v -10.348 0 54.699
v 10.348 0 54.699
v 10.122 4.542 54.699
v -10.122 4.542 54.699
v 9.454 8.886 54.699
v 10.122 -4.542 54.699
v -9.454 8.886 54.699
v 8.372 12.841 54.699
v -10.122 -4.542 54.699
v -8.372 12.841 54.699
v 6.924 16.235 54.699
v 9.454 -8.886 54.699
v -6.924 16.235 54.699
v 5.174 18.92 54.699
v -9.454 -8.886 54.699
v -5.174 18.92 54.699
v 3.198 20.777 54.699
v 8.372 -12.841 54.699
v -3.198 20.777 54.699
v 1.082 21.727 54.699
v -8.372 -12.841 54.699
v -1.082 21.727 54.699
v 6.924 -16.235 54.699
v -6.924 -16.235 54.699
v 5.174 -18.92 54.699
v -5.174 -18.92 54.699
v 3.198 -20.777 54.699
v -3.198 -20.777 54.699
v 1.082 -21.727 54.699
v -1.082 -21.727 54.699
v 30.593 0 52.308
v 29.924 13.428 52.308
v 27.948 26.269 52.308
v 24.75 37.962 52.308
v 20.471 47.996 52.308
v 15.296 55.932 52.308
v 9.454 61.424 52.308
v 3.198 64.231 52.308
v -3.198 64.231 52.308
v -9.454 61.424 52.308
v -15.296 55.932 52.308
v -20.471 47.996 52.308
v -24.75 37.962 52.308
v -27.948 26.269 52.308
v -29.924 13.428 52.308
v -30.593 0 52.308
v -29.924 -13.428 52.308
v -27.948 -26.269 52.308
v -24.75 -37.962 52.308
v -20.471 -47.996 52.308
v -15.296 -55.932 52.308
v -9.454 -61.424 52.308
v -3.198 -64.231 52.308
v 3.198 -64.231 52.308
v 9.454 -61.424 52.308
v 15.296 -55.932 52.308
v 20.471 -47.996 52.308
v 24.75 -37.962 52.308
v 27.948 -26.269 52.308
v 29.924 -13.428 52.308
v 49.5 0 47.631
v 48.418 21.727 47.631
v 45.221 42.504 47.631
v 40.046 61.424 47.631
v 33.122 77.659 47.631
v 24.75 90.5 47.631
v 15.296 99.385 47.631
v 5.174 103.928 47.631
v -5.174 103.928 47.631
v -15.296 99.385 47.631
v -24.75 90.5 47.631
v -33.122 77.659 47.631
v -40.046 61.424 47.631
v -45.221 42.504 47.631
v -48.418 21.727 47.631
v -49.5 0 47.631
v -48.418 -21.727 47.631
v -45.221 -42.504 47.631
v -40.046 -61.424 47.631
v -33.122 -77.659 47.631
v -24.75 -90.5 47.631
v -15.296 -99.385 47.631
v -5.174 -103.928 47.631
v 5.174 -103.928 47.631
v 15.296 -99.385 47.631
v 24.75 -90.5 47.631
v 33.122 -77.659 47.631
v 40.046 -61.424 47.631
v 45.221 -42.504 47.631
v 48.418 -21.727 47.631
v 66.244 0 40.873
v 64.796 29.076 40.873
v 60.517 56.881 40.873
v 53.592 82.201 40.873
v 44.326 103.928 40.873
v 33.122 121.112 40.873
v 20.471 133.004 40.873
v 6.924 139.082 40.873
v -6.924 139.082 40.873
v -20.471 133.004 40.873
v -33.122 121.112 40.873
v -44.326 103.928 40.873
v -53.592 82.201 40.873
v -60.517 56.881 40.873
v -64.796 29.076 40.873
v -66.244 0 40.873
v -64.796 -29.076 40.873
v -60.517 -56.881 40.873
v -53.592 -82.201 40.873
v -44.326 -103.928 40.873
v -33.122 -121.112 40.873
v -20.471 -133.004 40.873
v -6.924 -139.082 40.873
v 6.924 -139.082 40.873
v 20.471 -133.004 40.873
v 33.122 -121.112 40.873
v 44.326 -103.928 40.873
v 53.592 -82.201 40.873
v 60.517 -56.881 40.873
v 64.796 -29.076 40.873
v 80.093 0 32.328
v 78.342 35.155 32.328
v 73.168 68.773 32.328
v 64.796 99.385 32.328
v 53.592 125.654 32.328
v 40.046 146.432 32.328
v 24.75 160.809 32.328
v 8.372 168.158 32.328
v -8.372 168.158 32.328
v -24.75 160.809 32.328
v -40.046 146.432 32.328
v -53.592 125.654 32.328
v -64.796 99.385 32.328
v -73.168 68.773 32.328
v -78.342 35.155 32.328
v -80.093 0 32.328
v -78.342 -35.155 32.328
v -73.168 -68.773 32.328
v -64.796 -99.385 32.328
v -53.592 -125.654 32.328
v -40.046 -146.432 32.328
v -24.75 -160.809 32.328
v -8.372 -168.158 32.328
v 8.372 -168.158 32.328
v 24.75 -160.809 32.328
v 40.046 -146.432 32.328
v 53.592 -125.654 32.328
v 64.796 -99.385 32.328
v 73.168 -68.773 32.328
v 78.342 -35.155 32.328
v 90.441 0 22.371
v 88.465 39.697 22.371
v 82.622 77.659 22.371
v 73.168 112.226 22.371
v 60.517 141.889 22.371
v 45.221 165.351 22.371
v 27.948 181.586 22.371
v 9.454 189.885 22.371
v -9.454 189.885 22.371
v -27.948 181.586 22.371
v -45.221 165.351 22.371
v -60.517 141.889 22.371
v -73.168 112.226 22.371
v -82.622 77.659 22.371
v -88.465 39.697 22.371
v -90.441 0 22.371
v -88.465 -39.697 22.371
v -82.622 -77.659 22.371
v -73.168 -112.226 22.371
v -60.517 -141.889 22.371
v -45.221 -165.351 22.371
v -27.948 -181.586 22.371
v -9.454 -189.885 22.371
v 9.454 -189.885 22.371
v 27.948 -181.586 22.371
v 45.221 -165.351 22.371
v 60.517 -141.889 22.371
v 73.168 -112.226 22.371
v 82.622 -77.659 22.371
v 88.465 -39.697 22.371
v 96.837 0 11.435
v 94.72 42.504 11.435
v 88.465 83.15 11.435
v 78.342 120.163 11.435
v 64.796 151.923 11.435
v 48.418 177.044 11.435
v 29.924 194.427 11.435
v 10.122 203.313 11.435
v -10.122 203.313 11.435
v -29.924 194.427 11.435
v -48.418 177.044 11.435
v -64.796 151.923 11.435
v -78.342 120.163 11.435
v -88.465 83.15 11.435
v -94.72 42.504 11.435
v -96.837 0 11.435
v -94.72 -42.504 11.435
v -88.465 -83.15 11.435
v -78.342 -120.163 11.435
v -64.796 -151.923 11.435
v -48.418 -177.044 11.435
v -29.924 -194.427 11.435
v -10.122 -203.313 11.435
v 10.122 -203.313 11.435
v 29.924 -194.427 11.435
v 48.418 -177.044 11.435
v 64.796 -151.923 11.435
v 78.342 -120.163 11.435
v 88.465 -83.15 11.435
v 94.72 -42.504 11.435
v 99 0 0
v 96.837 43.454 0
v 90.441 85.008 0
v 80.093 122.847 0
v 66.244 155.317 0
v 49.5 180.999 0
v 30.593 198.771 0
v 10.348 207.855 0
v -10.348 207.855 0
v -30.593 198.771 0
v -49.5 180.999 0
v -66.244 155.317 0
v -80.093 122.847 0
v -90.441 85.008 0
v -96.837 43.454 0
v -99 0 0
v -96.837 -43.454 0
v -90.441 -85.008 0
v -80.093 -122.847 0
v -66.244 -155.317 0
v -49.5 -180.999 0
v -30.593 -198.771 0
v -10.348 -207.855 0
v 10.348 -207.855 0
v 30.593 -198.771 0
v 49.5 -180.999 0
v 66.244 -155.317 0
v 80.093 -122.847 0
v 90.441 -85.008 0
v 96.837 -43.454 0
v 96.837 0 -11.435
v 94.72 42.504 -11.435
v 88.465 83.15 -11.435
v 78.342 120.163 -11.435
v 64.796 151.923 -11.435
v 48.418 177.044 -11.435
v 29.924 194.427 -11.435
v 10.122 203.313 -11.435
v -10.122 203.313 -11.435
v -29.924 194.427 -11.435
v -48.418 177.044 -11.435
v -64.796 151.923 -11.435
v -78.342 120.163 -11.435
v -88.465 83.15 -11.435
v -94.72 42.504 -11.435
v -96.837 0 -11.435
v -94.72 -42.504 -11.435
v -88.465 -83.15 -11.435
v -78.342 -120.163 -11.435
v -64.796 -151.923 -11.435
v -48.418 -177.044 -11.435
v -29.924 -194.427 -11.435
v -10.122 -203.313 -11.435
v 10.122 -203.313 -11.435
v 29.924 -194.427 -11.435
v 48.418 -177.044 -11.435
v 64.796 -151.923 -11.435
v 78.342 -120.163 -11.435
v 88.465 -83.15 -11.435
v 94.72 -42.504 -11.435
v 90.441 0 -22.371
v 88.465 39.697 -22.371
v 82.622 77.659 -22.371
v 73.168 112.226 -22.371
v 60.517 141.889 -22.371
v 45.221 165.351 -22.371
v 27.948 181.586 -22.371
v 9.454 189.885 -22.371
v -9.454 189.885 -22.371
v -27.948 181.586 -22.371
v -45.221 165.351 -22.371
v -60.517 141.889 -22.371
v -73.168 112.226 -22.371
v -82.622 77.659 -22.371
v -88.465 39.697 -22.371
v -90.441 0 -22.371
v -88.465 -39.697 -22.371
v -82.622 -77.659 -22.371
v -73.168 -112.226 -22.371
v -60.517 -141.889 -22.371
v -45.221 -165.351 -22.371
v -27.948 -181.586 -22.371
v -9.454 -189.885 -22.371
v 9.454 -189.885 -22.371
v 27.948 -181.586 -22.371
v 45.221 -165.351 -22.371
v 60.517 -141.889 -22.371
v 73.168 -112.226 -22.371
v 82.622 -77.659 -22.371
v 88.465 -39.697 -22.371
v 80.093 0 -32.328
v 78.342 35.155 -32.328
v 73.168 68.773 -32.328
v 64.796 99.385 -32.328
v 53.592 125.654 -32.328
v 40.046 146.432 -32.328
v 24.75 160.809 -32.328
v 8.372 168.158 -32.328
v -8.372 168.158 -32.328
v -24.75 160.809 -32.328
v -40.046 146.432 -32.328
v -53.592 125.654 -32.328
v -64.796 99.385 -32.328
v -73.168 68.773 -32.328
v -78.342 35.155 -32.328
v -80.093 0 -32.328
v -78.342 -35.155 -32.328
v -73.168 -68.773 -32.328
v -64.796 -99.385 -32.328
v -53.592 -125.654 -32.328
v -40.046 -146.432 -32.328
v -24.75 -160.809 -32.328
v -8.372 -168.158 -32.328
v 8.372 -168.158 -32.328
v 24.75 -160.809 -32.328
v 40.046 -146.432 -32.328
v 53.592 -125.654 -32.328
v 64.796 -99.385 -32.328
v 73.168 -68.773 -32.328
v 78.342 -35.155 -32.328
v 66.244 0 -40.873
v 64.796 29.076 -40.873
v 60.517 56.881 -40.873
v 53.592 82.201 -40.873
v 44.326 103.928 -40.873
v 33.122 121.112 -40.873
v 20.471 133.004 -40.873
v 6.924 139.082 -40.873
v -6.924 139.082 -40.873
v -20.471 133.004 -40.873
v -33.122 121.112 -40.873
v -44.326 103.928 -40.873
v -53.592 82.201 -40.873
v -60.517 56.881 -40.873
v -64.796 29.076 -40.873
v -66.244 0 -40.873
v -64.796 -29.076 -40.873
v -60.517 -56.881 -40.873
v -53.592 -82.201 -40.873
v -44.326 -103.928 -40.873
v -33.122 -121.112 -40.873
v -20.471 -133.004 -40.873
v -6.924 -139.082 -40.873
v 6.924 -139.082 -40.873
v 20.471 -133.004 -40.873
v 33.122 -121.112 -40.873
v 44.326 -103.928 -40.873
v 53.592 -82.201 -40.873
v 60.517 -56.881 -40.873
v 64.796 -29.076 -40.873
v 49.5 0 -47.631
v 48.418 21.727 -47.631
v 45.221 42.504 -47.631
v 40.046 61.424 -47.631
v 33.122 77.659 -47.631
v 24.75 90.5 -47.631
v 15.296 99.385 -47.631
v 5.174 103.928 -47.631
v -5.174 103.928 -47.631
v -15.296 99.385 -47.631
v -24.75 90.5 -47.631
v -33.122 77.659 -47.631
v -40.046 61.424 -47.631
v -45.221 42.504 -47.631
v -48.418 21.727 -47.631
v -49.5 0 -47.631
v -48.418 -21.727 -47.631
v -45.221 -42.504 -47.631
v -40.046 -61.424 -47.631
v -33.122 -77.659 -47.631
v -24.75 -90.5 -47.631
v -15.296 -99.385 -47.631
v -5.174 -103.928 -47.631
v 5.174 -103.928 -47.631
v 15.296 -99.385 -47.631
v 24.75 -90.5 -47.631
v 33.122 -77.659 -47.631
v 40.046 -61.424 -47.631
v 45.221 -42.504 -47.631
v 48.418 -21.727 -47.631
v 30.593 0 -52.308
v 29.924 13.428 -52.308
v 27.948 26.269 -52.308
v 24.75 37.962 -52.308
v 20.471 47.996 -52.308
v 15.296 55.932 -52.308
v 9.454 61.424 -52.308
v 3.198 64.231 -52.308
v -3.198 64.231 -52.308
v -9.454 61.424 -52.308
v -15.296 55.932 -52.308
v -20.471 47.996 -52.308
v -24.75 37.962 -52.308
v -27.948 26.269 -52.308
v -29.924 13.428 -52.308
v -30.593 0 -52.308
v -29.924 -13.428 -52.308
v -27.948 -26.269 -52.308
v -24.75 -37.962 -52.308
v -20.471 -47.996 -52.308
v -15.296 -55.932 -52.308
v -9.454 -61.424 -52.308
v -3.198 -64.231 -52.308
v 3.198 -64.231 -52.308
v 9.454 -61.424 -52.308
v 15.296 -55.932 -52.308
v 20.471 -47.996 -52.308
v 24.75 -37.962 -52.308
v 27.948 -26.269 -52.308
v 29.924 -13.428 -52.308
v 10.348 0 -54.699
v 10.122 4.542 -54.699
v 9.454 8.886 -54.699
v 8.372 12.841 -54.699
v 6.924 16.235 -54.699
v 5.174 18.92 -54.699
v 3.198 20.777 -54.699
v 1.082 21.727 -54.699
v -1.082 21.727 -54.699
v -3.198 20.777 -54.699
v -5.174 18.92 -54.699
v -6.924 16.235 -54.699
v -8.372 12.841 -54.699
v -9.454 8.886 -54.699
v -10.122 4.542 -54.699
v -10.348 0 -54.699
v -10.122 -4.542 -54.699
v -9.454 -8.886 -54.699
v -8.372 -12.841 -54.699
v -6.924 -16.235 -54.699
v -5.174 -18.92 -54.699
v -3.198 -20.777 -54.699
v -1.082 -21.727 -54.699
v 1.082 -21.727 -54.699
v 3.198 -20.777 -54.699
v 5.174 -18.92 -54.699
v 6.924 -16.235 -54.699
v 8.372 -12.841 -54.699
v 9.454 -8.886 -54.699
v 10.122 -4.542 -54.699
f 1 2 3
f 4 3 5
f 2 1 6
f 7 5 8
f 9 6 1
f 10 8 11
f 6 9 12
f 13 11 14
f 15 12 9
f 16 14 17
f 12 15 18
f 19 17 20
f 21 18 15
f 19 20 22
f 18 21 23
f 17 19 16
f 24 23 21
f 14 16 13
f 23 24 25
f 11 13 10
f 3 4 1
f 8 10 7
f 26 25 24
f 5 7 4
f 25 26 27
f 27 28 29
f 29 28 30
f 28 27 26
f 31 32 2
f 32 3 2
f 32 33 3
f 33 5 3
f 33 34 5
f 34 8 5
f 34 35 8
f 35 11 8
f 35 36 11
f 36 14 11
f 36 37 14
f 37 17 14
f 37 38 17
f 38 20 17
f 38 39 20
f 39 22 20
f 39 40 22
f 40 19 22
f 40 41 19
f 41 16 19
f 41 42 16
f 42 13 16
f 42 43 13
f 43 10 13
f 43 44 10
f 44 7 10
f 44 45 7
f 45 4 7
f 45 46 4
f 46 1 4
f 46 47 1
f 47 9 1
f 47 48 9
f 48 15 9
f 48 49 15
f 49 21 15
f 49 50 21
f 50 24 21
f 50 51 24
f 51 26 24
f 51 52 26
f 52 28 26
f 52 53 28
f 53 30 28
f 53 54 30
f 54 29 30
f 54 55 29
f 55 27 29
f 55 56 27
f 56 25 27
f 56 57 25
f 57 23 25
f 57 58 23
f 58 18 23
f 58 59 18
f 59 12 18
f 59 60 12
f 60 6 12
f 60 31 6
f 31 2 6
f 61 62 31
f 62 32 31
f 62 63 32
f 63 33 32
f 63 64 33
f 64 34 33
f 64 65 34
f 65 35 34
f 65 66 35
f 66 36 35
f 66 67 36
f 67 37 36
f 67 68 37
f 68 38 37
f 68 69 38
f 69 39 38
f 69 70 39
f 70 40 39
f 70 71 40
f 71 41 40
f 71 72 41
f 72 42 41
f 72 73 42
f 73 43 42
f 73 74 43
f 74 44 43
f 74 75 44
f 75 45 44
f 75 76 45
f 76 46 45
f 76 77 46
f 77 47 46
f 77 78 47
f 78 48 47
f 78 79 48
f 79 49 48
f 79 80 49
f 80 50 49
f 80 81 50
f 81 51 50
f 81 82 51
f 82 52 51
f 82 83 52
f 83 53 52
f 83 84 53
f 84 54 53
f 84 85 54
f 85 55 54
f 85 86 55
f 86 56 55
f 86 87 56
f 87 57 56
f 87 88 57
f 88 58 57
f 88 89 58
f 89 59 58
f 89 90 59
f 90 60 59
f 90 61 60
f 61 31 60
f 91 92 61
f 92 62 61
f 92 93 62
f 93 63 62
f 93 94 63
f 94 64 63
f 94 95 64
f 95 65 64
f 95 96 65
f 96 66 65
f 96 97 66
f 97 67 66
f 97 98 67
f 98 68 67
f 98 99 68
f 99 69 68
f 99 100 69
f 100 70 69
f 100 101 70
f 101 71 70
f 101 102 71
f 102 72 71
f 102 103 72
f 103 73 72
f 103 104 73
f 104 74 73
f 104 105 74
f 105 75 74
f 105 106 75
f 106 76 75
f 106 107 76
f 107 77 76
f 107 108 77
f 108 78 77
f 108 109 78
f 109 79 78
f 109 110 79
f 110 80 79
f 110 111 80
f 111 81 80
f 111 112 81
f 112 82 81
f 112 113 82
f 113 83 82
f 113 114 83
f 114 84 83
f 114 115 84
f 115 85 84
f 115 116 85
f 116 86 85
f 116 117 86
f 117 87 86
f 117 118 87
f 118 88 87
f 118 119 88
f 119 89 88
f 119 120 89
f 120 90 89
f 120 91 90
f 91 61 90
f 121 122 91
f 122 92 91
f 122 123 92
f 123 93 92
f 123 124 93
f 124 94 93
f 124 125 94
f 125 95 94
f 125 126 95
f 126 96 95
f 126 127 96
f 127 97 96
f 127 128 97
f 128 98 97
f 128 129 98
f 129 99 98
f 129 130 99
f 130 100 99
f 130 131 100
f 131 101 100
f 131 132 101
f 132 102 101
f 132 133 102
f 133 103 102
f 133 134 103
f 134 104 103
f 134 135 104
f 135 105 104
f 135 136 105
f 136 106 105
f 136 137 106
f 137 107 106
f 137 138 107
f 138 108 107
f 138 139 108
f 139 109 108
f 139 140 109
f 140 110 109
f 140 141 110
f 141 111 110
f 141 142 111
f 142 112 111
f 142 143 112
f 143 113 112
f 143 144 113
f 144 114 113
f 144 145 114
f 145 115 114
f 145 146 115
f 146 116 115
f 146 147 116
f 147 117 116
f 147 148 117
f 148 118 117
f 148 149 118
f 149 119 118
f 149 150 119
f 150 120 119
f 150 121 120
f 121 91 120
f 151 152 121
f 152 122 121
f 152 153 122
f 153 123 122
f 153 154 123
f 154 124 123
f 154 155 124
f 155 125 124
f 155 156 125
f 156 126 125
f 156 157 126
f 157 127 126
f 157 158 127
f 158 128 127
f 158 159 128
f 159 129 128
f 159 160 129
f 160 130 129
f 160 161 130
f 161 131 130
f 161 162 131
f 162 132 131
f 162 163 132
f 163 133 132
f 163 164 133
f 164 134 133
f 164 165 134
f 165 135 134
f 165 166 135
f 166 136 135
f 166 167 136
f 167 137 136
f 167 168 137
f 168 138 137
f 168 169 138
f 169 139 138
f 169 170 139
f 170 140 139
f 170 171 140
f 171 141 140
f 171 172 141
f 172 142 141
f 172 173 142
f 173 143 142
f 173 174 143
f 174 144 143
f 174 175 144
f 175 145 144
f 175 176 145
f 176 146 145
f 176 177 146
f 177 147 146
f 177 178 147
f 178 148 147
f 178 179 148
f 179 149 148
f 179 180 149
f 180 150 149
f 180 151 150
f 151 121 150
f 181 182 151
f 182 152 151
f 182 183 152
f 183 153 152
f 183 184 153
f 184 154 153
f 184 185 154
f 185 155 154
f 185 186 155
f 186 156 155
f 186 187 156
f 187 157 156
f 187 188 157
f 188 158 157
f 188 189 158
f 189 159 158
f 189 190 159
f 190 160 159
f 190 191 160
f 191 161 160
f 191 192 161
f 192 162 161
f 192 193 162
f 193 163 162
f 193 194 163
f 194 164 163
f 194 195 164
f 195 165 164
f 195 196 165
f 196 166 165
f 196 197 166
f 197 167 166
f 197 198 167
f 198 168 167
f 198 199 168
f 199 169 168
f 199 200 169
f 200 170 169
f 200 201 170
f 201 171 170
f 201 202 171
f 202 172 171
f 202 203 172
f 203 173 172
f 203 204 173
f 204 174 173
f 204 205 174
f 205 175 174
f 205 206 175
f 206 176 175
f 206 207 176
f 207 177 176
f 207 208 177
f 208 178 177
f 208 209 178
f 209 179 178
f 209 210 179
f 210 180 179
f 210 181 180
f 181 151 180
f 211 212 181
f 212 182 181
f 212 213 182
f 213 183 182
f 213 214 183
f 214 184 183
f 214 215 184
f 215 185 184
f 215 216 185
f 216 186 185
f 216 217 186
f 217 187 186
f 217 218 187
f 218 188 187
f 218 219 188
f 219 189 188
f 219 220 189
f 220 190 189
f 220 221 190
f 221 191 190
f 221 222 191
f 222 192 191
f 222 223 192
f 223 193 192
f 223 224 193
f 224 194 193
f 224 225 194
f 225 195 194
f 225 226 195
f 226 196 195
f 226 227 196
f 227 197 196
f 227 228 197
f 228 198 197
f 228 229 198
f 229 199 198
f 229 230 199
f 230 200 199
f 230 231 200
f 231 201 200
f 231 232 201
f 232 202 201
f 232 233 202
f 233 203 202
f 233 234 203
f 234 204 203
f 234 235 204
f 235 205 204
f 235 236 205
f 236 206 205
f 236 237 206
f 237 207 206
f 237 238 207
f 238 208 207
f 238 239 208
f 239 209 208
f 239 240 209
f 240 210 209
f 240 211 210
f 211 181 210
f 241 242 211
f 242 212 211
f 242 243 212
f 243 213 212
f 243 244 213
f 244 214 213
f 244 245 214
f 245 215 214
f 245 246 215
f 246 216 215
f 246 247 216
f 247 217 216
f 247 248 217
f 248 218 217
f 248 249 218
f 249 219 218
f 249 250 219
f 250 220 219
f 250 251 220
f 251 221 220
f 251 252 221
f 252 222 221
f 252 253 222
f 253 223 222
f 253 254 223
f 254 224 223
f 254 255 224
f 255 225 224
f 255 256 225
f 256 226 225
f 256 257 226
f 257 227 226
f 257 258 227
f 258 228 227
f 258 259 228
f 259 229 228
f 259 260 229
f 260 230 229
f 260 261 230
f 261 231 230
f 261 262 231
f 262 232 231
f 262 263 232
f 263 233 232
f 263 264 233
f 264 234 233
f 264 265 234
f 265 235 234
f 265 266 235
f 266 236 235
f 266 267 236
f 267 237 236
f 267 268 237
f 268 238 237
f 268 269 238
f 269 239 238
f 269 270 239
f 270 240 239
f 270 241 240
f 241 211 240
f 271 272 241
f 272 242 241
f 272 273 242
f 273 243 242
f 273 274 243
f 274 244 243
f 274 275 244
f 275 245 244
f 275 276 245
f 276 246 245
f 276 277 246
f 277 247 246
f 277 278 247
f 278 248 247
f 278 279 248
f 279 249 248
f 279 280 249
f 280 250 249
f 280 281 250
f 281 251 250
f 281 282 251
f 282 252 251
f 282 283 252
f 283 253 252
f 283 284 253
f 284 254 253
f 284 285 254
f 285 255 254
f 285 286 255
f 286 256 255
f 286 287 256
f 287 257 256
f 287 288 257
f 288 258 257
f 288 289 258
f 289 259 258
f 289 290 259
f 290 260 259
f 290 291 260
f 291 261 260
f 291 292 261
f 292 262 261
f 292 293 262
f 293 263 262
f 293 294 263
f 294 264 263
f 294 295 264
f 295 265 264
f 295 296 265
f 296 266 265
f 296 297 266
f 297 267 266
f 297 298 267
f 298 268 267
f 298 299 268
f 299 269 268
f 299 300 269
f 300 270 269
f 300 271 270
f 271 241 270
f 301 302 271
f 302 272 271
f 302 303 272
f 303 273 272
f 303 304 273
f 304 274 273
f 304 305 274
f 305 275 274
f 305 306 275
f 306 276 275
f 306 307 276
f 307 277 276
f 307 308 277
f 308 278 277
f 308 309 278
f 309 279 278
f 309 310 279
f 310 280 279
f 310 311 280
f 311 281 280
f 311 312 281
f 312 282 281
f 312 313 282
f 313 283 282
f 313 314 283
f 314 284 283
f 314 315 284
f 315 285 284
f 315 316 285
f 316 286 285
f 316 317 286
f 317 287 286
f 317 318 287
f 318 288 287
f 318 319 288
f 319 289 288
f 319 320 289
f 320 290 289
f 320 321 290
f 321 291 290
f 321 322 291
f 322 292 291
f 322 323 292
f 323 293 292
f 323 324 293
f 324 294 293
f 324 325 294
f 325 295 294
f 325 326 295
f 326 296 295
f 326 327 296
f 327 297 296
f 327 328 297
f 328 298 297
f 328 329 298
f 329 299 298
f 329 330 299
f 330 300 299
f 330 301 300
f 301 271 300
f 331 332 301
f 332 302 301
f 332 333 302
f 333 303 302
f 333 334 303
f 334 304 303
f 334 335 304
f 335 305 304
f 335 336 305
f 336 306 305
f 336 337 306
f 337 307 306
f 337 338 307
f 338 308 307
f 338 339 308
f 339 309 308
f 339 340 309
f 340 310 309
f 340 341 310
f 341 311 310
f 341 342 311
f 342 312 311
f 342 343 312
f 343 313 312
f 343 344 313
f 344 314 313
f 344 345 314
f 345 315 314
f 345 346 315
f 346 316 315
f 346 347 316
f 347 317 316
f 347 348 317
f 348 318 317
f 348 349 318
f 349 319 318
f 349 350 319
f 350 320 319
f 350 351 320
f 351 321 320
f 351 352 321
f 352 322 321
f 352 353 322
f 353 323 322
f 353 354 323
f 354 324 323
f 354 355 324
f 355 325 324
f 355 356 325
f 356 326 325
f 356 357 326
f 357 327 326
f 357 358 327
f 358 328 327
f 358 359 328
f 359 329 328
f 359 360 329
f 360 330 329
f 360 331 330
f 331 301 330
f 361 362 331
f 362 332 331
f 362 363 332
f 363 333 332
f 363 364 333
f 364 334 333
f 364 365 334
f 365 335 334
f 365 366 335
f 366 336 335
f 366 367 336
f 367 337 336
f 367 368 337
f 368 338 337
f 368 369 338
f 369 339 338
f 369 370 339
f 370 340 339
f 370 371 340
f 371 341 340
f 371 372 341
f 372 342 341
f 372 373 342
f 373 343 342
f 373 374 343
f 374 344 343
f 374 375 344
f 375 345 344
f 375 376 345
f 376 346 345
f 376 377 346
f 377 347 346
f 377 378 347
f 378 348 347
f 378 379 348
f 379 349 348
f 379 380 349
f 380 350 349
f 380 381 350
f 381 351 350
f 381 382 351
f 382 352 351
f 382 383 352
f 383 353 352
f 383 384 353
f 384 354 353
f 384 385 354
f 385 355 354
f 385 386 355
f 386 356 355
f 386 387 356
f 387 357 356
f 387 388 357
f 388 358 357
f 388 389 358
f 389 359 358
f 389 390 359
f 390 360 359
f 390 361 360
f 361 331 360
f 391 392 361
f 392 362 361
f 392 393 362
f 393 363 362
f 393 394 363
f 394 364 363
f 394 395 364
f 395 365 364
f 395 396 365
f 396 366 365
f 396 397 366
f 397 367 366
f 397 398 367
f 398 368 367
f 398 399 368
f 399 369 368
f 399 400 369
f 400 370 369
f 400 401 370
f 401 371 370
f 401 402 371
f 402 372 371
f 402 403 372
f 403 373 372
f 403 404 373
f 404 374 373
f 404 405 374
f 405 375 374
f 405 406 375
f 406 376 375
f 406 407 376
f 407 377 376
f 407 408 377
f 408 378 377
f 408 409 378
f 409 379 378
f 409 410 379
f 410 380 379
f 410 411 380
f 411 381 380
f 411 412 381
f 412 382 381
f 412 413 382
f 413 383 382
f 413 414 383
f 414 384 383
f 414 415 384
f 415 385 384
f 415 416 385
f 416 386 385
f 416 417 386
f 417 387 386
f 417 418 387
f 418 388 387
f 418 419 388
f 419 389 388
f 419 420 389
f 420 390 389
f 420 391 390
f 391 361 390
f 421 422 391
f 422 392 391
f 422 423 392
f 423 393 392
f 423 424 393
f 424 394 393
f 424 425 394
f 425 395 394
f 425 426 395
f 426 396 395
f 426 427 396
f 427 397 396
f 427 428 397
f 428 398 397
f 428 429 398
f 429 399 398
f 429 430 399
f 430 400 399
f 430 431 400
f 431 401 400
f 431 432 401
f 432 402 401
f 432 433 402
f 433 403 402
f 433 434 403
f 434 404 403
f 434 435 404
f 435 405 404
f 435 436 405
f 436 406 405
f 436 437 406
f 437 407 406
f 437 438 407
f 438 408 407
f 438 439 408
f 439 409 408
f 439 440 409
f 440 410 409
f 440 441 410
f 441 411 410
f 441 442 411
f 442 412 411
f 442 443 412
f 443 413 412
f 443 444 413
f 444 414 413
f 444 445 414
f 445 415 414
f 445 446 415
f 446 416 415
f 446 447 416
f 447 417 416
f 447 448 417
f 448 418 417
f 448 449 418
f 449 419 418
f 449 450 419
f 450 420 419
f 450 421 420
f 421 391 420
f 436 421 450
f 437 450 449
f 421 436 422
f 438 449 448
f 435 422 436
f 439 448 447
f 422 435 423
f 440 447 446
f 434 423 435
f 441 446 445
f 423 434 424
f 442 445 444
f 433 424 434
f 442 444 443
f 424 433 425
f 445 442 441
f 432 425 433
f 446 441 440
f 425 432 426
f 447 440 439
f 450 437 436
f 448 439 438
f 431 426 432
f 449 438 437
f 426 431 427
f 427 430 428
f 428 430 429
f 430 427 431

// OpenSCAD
// Generated by SolidPython 1.0.1 on 2020-07-29 00:46:49


scale(v = [9, 19, 5]) {
	sphere(r = 11);
}
/***********************************************
*********      SolidPython code:      **********
************************************************
 
# import packages: SolidPython
from solid import *
from solid.utils import *
from itertools import chain, combinations, permutations


class Resize:

    def __init__(self, scad_file):
        self.scad_file = scad_file
        #self.scad_file = import_scad(scad_file)
        # cone/cylinder param:
        self.r1 = 0
        self.r2 = 0
        self.h = 0
        # rectangular prism param:
        self.w = 0
        self.l = 0
        # ellipse param:
        self.r = 0

    # import OpenScad code (file name corresponds to shape)


    # classify shape + parameters
    def assign(self, param1, param2, param3):
        if self.scad_file == 'cone.scad':
            self.r1 = param1
            self.r2 = param2
            self.h = param3
        elif self.scad_file == 'cylinder.scad':
            self.r1 = param1
            self.r2 = param2
            self.h = param3
        elif self.scad_file == 'rectangularPrism.scad':
            self.h = param1
            self.l = param2
            self.w = param3
        else:
            self.r = param1
            self.h = param2

    # resize parameters
    def iterate(self):
        x = range(3, 20, 2)
        i = 1
        if self.scad_file == 'cone.scad':
            tempList = list(permutations(x, 2))
            for temp in tempList:
                param1 = temp[0]
                param2 = temp[1]
                filepath = 'produced_scad_files/' + 'cone' + str(param1) + '_' + str(param2) + '_' + '.scad'
                scad_render_to_file(cylinder(h=param1, r1=param2, r2=0), filepath)

        elif self.scad_file == 'cylinder.scad':
            tempList = list(permutations(x, 3))
            for temp in tempList:
                param1 = temp[0]
                param2 = temp[1]
                filepath = 'produced_scad_files/' + 'cylinder' + str(param1) + '_' + str(param2) + '_' + '.scad'
                scad_render_to_file(cylinder(h=param1, r1=param2, r2=param2), filepath)

        elif self.scad_file == 'rectangularPrism.scad':
            tempList = list(permutations(x, 3))
            for temp in tempList:
                param1 = temp[0]
                param2 = temp[1]
                param3 = temp[2]
                filepath = 'produced_scad_files/' + 'rectangularPrism' + str(param1) + '_' + str(param2) + '_' + str(
                    param3) + '.scad'
                scad_render_to_file(cube(size=(param1, param2, param3)), filepath)

        elif self.scad_file == 'ellipse.scad':
            tempList = list(permutations(x, 4))
            for temp in tempList:
                param1 = temp[0]
                param2 = temp[1]
                param3 = temp[2]
                param4 = temp[3]
                filepath = 'produced_scad_files/' + 'ellipse' + str(param1) + '_' + str(param2) + '_' + str(param3) + '_' + str(param4) + '.scad'
                scad_render_to_file(scale([param1, param2, param3])(sphere(r=param4)), filepath)

    def render_to_scadfile(self):
        scad_render_to_file(scad, 'example.scad') 
 
************************************************/
